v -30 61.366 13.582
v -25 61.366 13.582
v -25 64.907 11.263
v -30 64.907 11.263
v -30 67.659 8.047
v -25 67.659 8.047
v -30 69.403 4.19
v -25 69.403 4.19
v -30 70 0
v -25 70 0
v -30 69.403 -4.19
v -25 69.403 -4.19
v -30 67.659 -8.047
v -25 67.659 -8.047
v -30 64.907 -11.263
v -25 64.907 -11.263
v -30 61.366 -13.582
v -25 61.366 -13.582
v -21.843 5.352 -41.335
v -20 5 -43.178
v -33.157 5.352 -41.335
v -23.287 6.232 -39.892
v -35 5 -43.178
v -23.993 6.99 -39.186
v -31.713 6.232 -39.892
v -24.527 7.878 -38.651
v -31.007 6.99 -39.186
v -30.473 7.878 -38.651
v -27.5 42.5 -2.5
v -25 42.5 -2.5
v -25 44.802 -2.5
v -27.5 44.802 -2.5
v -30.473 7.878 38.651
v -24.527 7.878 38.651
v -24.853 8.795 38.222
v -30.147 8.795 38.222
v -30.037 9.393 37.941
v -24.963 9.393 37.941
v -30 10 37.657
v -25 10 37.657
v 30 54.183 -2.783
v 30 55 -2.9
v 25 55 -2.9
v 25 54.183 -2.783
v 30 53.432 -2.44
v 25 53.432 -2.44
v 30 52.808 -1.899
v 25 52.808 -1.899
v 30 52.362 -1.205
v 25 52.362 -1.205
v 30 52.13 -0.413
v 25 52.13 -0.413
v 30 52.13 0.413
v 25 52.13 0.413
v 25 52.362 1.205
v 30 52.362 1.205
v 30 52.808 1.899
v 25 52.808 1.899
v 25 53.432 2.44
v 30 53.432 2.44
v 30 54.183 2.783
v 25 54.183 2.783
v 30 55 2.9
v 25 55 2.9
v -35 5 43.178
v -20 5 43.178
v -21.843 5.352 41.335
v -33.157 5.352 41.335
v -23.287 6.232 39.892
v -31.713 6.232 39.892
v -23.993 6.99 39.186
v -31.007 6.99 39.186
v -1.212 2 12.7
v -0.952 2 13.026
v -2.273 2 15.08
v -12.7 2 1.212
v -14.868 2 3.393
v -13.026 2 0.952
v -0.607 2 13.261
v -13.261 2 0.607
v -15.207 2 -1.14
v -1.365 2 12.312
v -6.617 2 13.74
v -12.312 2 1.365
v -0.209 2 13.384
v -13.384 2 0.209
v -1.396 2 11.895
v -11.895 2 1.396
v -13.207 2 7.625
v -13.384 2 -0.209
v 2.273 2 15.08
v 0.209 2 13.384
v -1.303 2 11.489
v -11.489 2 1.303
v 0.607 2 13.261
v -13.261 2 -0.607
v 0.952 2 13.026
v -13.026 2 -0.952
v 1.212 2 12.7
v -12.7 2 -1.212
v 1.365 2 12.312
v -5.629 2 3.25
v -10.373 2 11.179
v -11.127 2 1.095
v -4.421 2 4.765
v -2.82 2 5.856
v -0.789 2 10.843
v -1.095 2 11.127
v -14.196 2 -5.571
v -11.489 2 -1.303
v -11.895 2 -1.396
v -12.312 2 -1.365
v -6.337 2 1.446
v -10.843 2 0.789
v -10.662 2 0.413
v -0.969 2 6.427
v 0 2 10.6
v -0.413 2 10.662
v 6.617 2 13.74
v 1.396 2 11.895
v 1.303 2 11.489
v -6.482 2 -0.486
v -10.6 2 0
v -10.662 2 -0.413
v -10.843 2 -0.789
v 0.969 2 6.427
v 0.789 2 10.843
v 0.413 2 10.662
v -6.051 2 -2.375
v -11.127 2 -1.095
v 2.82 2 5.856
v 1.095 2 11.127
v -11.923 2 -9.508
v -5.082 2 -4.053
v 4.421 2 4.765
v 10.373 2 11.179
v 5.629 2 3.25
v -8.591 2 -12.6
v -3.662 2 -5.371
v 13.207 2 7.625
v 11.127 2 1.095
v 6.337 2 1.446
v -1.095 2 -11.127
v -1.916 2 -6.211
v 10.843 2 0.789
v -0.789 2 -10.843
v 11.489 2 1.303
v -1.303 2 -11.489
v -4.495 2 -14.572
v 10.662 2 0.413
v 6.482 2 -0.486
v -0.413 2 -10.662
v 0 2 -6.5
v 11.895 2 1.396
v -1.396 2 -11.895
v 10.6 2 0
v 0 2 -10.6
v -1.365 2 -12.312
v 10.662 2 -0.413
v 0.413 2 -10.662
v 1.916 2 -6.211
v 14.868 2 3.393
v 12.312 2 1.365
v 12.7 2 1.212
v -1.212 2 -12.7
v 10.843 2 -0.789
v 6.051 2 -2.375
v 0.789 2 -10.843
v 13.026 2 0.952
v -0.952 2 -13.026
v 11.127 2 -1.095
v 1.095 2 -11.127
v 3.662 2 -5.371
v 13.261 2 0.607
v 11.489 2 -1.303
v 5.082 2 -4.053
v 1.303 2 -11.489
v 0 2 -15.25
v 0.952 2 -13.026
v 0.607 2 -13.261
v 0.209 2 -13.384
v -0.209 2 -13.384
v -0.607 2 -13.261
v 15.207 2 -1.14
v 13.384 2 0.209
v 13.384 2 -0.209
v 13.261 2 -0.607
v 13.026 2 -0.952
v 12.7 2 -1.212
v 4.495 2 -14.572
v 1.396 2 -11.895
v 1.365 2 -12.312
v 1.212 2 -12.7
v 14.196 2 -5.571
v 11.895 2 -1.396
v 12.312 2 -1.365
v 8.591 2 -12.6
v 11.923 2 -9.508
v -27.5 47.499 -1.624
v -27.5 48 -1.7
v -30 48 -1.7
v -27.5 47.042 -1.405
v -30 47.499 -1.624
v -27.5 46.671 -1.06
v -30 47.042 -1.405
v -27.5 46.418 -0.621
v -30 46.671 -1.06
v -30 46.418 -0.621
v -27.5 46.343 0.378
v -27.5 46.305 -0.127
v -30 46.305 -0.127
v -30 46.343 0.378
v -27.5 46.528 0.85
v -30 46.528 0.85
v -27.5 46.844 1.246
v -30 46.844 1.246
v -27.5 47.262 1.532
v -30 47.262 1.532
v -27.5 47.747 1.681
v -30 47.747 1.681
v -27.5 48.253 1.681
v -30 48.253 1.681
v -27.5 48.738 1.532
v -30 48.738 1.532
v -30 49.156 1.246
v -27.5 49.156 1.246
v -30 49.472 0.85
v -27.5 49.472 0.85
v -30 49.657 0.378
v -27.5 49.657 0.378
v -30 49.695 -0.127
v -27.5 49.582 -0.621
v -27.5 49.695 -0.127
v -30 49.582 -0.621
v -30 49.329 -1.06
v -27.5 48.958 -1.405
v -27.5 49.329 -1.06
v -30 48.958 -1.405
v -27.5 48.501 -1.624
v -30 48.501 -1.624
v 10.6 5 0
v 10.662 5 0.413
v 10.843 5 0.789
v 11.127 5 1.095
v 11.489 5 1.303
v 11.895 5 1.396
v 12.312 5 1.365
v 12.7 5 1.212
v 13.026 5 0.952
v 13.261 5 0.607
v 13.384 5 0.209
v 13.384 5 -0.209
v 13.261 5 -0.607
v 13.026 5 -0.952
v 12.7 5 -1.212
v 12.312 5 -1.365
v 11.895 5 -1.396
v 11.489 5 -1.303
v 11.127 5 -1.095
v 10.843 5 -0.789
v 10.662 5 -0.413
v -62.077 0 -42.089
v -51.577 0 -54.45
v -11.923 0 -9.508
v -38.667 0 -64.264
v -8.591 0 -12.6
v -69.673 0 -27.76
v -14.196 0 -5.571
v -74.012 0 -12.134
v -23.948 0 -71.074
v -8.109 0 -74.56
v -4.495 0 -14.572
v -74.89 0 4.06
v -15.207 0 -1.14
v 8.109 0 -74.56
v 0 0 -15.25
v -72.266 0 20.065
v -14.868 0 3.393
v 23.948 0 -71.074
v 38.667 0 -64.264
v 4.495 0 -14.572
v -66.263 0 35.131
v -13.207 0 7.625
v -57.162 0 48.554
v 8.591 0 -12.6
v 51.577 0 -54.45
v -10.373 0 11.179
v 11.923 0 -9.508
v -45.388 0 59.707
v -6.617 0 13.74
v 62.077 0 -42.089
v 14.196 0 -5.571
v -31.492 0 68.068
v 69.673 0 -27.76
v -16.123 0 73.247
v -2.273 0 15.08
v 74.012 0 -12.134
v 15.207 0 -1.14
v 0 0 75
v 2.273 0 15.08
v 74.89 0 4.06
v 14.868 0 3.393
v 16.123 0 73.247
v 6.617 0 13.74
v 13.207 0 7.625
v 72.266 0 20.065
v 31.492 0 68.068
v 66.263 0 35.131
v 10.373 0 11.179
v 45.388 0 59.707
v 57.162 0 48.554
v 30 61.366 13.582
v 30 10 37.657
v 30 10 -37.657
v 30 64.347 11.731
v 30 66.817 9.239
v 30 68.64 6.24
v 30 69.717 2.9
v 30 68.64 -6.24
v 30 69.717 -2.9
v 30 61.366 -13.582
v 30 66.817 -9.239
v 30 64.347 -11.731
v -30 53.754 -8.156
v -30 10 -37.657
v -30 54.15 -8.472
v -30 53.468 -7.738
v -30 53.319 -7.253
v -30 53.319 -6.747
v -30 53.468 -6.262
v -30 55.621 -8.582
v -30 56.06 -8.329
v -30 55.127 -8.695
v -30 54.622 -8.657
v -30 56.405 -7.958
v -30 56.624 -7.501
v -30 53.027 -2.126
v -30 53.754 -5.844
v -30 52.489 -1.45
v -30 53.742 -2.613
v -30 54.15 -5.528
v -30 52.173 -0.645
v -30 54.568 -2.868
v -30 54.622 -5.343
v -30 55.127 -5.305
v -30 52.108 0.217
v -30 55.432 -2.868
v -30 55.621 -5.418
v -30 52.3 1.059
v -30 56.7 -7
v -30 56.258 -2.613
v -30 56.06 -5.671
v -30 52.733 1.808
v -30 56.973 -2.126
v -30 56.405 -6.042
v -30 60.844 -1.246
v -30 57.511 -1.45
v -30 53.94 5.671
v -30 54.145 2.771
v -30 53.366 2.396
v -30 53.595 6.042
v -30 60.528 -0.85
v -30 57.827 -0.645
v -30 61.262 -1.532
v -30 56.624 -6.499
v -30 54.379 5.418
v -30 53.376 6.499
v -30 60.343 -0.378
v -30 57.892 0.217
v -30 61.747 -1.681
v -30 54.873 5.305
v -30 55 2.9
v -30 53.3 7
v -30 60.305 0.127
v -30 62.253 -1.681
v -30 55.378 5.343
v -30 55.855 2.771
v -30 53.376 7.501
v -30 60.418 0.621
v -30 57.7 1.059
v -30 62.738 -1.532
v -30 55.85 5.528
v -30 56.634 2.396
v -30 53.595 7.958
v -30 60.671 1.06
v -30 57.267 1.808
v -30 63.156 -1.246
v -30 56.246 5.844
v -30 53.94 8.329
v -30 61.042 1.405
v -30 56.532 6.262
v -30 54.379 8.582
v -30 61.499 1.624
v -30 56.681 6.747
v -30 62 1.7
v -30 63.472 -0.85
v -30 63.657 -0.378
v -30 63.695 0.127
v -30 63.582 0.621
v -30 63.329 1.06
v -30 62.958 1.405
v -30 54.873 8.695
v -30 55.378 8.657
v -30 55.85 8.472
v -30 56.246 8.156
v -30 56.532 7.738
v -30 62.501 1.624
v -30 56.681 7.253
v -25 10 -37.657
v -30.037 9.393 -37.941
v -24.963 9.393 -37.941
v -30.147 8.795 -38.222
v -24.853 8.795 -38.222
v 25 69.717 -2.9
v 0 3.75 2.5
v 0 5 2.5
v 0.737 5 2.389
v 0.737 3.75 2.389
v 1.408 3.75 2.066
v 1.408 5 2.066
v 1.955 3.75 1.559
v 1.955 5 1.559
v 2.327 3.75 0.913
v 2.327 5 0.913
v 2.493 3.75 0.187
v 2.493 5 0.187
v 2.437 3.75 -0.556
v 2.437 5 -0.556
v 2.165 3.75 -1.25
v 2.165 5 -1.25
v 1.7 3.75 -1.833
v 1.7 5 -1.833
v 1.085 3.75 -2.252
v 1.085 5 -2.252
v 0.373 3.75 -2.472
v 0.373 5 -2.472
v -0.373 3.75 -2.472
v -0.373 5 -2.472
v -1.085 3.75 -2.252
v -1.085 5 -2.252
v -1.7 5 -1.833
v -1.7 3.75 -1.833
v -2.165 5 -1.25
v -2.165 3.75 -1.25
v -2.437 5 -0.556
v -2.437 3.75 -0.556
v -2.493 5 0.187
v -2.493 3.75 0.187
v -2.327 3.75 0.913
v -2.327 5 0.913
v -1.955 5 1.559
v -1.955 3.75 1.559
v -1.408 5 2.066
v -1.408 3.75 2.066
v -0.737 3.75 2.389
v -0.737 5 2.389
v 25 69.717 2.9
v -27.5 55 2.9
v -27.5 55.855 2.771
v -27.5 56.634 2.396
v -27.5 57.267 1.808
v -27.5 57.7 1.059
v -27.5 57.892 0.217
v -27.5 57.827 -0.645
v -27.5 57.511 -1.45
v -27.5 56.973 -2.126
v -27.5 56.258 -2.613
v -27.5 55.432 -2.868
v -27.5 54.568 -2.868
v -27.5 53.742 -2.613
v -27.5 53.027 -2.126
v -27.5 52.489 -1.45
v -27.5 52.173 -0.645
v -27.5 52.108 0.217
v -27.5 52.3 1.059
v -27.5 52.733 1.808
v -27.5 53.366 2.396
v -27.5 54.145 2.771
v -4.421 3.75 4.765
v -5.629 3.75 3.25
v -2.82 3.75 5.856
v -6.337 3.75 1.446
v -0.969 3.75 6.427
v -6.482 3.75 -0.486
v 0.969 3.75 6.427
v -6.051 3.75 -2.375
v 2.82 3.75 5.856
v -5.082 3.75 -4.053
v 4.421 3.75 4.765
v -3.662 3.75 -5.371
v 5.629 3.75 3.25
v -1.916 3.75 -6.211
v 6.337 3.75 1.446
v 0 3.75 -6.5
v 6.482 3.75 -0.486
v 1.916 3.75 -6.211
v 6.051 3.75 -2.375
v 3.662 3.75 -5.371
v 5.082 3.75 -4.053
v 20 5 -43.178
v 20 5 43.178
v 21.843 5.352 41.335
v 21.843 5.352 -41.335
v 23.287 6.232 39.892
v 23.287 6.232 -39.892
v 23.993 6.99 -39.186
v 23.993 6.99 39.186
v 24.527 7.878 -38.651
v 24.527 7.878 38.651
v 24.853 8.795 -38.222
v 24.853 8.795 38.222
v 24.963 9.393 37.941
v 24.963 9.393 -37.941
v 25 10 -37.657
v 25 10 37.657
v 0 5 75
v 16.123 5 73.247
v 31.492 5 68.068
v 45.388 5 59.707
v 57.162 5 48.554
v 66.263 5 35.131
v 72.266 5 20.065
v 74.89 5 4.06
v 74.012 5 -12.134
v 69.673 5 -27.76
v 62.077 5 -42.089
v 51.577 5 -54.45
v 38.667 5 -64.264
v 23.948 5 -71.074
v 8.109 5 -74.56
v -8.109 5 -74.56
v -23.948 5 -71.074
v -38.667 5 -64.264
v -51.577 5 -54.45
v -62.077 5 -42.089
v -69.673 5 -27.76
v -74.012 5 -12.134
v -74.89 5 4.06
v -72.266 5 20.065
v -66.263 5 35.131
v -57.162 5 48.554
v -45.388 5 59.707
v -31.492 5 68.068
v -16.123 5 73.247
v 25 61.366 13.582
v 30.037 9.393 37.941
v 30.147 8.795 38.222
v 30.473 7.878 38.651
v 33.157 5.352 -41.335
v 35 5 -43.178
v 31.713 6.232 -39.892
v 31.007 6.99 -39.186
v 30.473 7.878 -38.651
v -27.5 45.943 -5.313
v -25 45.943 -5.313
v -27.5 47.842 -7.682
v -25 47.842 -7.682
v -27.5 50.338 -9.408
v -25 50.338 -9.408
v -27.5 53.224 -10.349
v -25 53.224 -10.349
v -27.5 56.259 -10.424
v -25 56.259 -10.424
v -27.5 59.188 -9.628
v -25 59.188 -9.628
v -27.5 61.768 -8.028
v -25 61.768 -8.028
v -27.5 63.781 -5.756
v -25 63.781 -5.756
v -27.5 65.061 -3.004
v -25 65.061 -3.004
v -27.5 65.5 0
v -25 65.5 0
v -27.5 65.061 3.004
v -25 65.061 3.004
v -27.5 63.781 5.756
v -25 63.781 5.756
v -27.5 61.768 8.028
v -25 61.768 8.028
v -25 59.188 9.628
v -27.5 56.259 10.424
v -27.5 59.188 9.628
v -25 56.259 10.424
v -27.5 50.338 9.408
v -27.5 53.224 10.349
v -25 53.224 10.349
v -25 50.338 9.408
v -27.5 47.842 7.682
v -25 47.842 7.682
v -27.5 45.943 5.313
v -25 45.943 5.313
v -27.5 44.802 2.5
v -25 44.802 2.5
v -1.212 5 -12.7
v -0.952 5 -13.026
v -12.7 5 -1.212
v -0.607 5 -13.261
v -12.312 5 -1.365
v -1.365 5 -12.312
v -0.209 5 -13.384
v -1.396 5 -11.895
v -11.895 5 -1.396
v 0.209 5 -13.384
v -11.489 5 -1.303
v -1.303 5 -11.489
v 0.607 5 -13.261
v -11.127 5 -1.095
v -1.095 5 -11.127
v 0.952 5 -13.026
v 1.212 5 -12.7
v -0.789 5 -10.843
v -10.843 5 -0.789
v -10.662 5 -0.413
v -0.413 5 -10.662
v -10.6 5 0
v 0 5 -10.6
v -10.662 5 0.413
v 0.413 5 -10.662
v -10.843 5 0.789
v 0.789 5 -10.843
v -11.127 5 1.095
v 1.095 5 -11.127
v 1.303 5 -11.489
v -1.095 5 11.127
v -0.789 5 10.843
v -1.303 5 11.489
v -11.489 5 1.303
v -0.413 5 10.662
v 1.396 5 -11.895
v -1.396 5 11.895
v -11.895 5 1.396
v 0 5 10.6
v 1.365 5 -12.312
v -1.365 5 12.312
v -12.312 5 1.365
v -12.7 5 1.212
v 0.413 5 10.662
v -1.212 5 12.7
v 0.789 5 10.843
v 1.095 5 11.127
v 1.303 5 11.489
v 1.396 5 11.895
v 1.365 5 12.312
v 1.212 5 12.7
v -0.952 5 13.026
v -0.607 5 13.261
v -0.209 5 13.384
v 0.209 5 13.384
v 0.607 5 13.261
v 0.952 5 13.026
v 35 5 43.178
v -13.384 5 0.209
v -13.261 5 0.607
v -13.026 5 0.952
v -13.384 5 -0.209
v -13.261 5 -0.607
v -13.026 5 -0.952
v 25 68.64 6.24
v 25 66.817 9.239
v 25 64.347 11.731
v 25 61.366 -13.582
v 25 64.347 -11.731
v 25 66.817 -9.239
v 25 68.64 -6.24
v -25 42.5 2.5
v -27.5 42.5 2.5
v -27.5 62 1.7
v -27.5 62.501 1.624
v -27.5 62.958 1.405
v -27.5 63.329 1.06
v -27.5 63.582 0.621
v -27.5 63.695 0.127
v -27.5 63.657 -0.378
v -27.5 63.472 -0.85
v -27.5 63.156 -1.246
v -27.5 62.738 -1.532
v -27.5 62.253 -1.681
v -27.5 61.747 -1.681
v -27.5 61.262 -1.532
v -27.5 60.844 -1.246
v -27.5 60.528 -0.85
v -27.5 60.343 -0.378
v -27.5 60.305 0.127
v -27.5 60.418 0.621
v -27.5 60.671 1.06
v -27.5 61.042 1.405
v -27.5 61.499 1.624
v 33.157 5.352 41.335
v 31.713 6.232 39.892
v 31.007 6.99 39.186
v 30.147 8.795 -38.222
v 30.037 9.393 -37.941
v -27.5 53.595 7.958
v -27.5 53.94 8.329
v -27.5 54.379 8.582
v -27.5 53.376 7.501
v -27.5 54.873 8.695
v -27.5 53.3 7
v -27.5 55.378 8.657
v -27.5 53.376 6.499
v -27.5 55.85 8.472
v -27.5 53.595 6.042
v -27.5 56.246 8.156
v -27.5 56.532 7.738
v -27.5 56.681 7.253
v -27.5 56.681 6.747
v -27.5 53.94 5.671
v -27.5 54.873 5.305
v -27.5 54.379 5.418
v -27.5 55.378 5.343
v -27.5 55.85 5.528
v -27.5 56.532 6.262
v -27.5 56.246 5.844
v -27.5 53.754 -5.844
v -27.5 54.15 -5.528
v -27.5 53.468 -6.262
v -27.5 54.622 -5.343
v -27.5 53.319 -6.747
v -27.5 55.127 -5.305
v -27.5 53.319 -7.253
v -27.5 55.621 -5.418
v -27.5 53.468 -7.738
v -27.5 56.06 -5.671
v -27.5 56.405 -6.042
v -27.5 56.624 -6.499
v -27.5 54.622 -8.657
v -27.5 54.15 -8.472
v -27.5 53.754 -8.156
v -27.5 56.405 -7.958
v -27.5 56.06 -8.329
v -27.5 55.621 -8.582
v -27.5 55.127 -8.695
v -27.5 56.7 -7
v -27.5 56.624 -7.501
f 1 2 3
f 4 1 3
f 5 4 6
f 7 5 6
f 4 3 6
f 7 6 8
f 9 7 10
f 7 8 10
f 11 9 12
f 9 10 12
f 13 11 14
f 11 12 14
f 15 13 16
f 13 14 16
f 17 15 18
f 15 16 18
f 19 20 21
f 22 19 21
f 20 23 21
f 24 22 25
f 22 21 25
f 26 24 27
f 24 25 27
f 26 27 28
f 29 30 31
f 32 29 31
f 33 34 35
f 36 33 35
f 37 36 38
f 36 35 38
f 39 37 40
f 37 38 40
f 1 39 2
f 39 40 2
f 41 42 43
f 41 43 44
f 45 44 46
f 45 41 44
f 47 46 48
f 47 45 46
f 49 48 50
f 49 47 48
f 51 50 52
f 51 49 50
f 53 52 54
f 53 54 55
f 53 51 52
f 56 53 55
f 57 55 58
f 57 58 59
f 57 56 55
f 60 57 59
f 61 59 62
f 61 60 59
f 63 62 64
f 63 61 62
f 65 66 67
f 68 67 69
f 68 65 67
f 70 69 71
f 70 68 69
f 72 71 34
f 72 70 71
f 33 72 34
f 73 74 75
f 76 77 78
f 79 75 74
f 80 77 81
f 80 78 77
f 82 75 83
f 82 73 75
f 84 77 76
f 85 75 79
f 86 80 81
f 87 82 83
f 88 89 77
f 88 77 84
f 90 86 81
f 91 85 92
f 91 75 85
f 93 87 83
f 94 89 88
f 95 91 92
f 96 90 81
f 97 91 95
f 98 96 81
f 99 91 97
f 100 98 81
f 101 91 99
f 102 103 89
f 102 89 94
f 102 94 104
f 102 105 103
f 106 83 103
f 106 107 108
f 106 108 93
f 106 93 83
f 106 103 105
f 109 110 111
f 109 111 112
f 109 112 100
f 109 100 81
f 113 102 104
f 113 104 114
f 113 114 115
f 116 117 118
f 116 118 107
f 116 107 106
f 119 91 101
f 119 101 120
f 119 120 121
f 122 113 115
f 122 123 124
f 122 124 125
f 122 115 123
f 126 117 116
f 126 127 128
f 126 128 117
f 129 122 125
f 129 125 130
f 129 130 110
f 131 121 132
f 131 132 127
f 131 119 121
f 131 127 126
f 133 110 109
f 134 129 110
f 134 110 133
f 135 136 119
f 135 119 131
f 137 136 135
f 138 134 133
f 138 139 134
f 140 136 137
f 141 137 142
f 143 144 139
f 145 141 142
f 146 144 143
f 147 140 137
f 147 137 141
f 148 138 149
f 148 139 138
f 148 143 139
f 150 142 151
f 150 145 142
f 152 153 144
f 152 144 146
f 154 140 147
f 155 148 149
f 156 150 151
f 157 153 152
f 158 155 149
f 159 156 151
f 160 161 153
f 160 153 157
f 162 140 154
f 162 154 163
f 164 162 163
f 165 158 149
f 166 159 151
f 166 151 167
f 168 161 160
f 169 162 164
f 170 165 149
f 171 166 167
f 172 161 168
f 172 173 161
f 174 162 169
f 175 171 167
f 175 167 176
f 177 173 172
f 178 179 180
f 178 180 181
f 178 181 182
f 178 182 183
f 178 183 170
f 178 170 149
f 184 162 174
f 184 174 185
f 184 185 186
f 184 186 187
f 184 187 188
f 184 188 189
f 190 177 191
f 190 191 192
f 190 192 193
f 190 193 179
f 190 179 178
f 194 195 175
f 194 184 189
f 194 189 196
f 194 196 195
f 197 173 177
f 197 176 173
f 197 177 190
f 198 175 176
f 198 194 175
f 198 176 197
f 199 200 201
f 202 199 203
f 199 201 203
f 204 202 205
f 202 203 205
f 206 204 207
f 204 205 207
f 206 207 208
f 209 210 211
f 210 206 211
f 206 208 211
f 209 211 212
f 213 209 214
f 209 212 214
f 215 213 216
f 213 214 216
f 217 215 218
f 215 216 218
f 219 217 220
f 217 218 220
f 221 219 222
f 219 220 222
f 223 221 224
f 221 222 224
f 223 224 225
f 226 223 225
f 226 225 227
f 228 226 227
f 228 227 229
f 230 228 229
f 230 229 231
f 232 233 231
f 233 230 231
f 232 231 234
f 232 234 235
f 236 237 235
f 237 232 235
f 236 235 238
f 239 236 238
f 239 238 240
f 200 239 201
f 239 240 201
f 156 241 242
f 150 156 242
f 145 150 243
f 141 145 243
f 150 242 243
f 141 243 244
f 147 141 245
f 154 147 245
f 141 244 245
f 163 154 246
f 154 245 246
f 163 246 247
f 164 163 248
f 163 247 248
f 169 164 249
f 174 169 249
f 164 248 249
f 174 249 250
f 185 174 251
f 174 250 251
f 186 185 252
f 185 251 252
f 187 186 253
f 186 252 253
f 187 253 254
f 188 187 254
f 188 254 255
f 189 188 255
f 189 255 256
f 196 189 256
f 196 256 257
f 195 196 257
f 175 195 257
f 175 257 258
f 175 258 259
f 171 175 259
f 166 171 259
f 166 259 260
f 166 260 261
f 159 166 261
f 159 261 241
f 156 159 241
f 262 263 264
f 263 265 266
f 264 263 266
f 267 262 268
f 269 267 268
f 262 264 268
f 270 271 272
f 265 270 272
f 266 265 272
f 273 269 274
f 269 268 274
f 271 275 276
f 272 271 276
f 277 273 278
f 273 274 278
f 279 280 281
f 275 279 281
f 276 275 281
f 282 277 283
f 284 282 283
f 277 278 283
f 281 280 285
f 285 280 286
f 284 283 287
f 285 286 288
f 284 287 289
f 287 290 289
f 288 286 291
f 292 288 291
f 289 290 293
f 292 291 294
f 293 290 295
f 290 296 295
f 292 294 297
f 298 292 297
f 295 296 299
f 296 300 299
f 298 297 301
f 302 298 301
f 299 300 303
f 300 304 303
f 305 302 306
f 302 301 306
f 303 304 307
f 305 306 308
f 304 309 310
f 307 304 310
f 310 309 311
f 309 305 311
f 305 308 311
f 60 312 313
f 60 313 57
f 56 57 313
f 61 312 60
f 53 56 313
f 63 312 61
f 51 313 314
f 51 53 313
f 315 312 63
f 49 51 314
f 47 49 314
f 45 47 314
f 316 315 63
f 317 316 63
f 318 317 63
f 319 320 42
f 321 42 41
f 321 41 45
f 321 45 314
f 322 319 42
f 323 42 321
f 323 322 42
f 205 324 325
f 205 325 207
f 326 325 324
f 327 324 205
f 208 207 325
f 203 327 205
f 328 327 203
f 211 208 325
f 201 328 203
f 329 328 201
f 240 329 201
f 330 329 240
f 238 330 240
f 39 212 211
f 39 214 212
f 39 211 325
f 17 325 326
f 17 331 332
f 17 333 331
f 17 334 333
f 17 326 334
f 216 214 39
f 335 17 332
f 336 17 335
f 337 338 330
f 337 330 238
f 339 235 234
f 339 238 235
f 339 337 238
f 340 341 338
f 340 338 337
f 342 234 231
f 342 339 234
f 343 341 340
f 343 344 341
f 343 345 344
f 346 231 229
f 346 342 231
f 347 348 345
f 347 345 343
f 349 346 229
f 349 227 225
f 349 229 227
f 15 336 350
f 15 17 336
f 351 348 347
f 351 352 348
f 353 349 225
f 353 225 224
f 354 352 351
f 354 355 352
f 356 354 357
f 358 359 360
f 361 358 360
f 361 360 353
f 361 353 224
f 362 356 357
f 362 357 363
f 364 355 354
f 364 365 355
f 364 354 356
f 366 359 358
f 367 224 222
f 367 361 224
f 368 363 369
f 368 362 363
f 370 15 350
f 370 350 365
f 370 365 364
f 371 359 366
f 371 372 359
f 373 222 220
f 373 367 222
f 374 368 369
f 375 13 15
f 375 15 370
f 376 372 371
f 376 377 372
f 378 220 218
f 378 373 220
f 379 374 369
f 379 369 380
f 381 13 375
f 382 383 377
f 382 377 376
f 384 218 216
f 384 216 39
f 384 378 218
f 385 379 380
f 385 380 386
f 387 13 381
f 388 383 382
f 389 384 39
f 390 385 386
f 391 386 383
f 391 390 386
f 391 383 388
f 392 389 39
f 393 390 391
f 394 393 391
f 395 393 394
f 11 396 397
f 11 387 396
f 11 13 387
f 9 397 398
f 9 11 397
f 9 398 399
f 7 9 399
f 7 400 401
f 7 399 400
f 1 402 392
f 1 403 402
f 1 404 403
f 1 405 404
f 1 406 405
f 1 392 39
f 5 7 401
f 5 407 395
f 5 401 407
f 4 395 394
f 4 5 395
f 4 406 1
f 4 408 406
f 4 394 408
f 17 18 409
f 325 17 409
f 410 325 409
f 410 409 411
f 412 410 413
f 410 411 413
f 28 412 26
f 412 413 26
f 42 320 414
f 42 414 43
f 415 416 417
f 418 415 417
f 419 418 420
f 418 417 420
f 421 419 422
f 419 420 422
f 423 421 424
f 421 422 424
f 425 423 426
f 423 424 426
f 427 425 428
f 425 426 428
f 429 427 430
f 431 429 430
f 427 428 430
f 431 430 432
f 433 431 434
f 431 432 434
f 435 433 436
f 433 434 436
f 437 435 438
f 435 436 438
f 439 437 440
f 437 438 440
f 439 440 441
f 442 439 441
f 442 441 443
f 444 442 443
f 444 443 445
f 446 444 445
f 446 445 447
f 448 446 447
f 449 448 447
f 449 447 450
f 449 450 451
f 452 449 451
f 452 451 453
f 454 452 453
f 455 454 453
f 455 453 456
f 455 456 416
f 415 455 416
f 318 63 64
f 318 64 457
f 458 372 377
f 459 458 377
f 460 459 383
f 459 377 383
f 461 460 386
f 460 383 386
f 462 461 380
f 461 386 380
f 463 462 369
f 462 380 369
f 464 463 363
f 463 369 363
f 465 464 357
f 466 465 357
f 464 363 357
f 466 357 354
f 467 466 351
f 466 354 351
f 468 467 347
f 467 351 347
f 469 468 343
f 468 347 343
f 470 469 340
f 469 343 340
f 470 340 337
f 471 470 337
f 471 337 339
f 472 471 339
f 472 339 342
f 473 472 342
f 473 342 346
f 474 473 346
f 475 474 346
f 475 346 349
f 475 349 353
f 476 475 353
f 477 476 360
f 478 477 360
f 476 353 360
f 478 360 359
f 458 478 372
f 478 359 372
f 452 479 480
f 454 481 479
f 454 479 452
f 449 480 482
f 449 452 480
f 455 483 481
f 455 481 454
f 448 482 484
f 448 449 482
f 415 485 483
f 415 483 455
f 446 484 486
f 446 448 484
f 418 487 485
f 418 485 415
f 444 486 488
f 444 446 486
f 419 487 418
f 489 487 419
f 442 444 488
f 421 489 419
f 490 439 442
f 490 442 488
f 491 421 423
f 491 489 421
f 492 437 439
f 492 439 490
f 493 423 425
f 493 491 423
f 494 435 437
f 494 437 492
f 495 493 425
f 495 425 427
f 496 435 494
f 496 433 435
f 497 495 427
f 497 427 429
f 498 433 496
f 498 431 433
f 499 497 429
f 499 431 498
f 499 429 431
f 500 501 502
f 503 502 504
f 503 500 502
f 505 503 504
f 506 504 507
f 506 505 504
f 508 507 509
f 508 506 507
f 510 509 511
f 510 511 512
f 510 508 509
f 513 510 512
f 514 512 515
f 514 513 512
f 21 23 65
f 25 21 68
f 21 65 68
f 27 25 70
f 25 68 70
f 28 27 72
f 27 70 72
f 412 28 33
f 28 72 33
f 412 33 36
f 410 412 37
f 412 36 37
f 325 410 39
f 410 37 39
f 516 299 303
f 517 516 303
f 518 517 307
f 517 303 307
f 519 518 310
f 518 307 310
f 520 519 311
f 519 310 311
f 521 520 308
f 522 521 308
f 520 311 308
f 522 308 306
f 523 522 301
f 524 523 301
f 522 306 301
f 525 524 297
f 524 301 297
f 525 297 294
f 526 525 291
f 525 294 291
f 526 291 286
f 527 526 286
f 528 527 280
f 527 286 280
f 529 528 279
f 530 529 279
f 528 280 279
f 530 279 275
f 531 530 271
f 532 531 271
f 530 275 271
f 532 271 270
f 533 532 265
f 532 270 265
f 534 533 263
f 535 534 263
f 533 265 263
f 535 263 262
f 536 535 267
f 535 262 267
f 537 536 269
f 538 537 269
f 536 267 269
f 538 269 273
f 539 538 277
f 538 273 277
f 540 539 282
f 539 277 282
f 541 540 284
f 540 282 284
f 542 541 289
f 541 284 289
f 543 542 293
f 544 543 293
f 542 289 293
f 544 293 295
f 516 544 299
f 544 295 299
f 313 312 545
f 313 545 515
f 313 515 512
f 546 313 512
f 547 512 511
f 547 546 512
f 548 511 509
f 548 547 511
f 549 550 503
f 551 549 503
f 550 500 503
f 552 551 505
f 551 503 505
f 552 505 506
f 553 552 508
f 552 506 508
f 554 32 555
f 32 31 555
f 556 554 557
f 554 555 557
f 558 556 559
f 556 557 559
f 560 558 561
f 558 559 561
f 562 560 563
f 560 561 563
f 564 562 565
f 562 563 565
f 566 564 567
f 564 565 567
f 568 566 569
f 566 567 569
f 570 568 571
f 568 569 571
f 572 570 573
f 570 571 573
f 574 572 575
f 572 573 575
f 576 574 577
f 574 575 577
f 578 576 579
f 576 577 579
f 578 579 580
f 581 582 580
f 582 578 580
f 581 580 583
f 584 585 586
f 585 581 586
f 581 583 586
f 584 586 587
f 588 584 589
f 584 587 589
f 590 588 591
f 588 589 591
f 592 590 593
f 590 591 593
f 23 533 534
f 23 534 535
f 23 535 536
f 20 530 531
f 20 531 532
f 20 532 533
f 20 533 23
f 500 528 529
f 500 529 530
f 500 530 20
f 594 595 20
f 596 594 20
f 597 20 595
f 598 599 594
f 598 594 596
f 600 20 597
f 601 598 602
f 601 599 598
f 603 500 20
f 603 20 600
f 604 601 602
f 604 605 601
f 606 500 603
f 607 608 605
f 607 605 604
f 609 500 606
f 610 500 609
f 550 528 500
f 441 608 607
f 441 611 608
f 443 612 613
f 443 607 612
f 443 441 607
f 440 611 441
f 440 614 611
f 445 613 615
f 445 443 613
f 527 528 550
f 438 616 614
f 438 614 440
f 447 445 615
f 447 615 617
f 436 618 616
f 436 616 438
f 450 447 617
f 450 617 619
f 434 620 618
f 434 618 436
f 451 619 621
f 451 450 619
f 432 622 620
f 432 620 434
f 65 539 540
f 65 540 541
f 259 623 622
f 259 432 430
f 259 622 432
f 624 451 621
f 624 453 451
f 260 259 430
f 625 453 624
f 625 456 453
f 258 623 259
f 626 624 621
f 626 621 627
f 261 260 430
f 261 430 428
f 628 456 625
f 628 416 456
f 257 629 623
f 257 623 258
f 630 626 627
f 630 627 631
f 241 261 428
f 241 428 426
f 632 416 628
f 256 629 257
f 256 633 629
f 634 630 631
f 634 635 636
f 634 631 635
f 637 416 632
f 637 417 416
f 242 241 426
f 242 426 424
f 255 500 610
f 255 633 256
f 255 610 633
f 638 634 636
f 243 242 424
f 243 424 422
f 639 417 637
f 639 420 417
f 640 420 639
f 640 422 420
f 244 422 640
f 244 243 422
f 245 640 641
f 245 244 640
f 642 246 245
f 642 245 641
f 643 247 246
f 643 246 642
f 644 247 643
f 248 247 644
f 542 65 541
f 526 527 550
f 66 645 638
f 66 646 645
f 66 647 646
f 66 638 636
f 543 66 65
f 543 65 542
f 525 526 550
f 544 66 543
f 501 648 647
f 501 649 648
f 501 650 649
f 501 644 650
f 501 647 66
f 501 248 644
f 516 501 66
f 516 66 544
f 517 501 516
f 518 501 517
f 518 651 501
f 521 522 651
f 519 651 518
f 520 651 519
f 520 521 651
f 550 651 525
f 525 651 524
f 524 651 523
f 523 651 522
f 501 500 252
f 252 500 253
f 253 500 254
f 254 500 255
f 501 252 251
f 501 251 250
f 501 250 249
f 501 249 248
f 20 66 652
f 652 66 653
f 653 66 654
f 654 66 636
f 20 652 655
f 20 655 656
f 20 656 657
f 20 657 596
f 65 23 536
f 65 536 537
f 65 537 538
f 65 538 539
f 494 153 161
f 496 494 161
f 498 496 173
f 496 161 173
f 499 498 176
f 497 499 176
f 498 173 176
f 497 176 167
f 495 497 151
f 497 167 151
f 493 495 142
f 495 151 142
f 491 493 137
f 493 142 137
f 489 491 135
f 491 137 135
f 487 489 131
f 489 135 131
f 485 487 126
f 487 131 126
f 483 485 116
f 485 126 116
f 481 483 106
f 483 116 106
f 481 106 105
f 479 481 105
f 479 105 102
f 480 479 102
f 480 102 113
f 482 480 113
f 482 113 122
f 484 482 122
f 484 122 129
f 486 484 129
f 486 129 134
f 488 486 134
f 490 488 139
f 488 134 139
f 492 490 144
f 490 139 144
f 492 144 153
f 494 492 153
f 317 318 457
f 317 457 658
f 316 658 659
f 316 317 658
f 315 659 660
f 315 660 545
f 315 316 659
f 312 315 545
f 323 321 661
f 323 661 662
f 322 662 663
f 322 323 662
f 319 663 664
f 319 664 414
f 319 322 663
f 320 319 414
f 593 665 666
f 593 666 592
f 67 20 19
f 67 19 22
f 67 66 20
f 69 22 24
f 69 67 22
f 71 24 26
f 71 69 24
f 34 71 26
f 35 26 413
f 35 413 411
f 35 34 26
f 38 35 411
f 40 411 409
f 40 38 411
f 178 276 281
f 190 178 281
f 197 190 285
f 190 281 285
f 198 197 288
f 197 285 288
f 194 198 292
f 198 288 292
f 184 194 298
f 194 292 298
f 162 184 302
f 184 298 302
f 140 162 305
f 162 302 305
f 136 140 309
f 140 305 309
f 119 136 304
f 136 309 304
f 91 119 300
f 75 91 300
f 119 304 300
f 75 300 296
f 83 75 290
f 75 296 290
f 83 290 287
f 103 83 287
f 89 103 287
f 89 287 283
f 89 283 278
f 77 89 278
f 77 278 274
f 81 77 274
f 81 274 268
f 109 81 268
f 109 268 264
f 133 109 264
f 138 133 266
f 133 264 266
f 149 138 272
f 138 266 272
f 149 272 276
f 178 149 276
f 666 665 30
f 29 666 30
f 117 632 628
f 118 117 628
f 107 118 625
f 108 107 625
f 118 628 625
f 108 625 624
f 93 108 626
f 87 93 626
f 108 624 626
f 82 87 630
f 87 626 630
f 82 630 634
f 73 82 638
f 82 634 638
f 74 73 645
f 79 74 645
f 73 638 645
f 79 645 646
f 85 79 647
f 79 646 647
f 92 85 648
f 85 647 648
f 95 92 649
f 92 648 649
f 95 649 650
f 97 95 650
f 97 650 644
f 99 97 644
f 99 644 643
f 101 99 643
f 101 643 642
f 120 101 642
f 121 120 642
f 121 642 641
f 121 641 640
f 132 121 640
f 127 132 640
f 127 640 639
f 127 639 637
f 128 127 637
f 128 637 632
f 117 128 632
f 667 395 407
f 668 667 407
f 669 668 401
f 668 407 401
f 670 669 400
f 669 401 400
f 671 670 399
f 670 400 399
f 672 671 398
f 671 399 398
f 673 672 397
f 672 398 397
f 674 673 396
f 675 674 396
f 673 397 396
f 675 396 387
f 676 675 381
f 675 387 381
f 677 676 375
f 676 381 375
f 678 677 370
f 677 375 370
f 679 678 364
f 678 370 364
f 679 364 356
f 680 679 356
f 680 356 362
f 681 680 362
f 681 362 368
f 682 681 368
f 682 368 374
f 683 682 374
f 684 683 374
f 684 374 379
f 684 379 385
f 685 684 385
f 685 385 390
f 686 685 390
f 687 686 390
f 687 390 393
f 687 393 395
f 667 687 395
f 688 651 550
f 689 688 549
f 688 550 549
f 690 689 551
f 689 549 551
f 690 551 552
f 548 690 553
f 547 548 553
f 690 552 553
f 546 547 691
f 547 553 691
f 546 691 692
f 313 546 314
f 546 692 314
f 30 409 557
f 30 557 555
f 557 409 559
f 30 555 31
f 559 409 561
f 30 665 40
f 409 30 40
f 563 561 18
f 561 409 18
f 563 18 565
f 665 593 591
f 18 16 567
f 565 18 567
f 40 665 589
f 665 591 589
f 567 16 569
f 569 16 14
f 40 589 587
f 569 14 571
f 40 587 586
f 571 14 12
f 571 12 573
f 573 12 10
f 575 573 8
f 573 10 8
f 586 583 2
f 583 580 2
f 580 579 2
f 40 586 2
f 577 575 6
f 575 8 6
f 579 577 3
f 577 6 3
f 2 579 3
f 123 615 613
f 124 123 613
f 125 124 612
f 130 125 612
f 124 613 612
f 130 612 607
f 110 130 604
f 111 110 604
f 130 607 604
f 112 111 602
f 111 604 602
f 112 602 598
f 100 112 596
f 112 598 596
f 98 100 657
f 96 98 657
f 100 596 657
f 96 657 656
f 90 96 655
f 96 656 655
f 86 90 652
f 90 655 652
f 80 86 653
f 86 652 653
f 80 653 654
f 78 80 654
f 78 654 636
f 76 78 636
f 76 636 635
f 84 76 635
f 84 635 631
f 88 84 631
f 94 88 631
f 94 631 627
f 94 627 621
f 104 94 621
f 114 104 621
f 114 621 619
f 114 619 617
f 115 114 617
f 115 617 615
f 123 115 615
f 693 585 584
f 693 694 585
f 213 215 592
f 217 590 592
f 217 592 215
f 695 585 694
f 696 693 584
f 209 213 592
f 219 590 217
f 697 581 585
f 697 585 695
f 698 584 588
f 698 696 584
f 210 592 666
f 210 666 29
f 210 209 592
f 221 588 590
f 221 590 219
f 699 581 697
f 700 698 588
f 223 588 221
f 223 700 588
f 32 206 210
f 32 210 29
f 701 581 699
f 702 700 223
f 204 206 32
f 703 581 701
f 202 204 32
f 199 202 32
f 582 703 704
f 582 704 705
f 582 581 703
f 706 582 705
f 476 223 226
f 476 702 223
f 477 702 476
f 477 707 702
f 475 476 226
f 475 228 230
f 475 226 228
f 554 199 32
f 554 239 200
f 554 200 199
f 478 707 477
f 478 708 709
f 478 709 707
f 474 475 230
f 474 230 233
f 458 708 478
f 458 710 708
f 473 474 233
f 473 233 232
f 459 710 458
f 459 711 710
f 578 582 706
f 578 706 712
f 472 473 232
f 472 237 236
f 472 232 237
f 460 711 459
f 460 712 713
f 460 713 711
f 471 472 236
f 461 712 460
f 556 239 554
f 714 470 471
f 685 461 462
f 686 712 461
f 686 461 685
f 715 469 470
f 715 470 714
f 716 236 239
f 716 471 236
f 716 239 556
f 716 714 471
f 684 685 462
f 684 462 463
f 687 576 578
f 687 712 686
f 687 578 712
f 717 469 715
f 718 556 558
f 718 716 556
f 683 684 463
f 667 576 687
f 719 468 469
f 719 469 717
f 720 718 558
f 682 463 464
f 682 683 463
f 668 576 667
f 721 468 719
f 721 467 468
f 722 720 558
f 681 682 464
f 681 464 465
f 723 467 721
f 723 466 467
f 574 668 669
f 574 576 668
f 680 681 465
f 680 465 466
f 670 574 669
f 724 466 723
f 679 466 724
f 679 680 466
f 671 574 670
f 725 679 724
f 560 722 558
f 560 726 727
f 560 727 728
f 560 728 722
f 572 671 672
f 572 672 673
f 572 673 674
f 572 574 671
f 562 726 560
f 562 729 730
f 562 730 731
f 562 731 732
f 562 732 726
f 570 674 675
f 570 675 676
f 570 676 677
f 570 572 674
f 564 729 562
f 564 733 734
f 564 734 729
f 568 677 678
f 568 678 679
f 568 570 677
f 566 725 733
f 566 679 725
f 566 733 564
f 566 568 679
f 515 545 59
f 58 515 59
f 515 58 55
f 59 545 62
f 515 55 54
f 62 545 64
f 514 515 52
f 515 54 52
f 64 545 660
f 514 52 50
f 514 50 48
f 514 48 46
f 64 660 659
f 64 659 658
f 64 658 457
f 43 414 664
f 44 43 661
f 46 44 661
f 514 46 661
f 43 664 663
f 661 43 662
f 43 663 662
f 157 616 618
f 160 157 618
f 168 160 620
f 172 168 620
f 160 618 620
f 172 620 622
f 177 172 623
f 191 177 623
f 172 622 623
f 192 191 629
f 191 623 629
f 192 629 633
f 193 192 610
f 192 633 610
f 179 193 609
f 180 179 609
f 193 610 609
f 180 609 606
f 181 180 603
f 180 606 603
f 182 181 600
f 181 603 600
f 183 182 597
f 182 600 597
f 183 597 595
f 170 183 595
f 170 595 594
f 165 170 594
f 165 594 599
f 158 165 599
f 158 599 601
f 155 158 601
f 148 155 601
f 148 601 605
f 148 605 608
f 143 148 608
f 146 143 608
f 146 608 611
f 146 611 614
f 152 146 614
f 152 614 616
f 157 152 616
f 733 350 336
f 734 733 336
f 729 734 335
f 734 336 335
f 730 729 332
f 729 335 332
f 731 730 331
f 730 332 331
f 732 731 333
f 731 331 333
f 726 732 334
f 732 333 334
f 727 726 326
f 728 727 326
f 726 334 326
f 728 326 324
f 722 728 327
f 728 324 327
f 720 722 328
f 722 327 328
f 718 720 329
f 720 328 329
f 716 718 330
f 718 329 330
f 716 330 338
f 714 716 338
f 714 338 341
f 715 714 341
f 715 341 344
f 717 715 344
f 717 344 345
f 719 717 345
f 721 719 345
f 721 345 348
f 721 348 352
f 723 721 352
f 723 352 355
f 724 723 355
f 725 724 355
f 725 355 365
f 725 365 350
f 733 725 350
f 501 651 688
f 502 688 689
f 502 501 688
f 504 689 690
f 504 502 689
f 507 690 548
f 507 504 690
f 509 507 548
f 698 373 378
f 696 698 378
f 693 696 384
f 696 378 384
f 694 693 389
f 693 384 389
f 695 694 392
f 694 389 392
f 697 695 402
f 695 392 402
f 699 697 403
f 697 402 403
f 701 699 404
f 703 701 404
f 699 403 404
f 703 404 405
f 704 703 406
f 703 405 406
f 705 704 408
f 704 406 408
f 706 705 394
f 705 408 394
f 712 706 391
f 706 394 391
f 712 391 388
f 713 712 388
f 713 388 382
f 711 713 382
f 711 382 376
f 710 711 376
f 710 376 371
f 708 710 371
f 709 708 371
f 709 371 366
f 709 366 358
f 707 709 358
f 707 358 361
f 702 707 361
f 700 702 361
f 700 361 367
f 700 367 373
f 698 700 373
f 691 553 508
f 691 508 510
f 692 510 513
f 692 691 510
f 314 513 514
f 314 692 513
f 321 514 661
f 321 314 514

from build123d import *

# Parameters (mm, degrees)
SKETCH1_R           = 75
BOSS_EXTRUDE1_DEPTH = 5
BOSS_EXTRUDE2_DEPTH = 5
BOSS_EXTRUDE3_START = -5
BOSS_EXTRUDE3_DEPTH = 5
SKETCH6_R           = 1.5
CUT_EXTRUDE1_DEPTH  = 5
SKETCH7_R           = 2.9
CUT_EXTRUDE2_DEPTH  = 2.5
SKETCH8_R           = 0.6
CUT_EXTRUDE3_DEPTH  = 5
CIRPATTERN1_COUNT   = 4
SKETCH10_R          = 1.7
CUT_EXTRUDE4_DEPTH  = 3
CIRPATTERN2_COUNT   = 4
SKETCH11_R          = 2.5
CUT_EXTRUDE5_DEPTH  = 5
SKETCH12_R          = 1.4
CUT_EXTRUDE6_DEPTH  = 5
CIRPATTERN3_COUNT   = 4
SKETCH16_R          = 10.5
CUT_EXTRUDE10_DEPTH = 2.5
CUT_EXTRUDE11_DEPTH = 5
FILLET1_R           = 5
SKETCH19_R          = 15.25
CUT_EXTRUDE12_DEPTH = 2
SKETCH20_W          = 5
SKETCH20_H          = 4
CUT_EXTRUDE13_DEPTH = 2.5
SKETCH21_R          = 6.5
CUT_EXTRUDE14_DEPTH = 1.75


with BuildPart() as part:
    # Sketch1 → Boss-Extrude1 (new body)
    with BuildSketch(Plane(origin=(0, 0, 0), x_dir=(1, 0, 0), z_dir=(0, 1, 0))):
        with Locations(Location((0, 0, 0), (0, 0, 270))):
            Circle(SKETCH1_R)
    extrude(amount=BOSS_EXTRUDE1_DEPTH)

    # Sketch4 → Boss-Extrude2 (add)
    with BuildSketch(Plane.ZY.offset(25)):
        with BuildLine():
            Line((-13.582225242, 61.365780194), (-40, 5))
            Line((-40, 5), (40, 5))
            Line((40, 5), (13.582225242, 61.365780194))
            ThreePointArc((13.582225242, 61.365780194), (0, 70), (-13.582225242, 61.365780194))
        make_face()
    extrude(amount=BOSS_EXTRUDE2_DEPTH)

    # Sketch5 → Boss-Extrude3 (add)
    with BuildSketch(Plane.ZY.offset(-25).offset(BOSS_EXTRUDE3_START)):
        with BuildLine():
            Line((13.582225242, 61.365780194), (40, 5))
            Line((40, 5), (-40, 5))
            Line((-40, 5), (-13.582225242, 61.365780194))
            ThreePointArc((-13.582225242, 61.365780194), (0, 70), (13.582225242, 61.365780194))
        make_face()
    extrude(amount=BOSS_EXTRUDE3_DEPTH)

    # Sketch6 → Cut-Extrude1 (cut)
    with BuildSketch(Plane.ZY.offset(30)):
        with Locations((0, 55)):
            Circle(SKETCH6_R)
    extrude(amount=-CUT_EXTRUDE1_DEPTH, mode=Mode.SUBTRACT)

    # Sketch7 → Cut-Extrude2 (cut)
    with BuildSketch(Plane.ZY.offset(30)):
        with Locations((0, 55)):
            Circle(SKETCH7_R)
    extrude(amount=-CUT_EXTRUDE2_DEPTH, mode=Mode.SUBTRACT)

    # Sketch8 → Cut-Extrude3 (cut)
    with BuildSketch(Plane.ZY.offset(30)):
        with Locations((0, 62.25)):
            Circle(SKETCH8_R)
    cut_extrude3 = extrude(amount=-CUT_EXTRUDE3_DEPTH, mode=Mode.SUBTRACT)

    # CirPattern1: Cut-Extrude3 ×4 about axis
    cirpattern1_axis = Axis((0, 55, 0), (1, 0, 0))
    for i in range(1, CIRPATTERN1_COUNT):
        add(cut_extrude3.rotate(cirpattern1_axis, i * 360 / CIRPATTERN1_COUNT), mode=Mode.SUBTRACT)

    # Sketch10 → Cut-Extrude4 (cut)
    with BuildSketch(Plane.ZY.offset(30)):
        with Locations((0, 62)):
            Circle(SKETCH10_R)
    cut_extrude4 = extrude(amount=-CUT_EXTRUDE4_DEPTH, mode=Mode.SUBTRACT)

    # CirPattern2: Cut-Extrude4 ×4 about axis
    cirpattern2_axis = Axis((0, 55, 0), (1, 0, 0))
    for i in range(1, CIRPATTERN2_COUNT):
        add(cut_extrude4.rotate(cirpattern2_axis, i * 360 / CIRPATTERN2_COUNT), mode=Mode.SUBTRACT)

    # Sketch11 → Cut-Extrude5 (cut)
    with BuildSketch(Plane(origin=(0, 5, 0), x_dir=(1, 0, 0), z_dir=(0, 1, 0))):
        with Locations(Location((0, 0, 0), (0, 0, 270))):
            Circle(SKETCH11_R)
    extrude(amount=-CUT_EXTRUDE5_DEPTH, mode=Mode.SUBTRACT)

    # Sketch12 → Cut-Extrude6 (cut)
    with BuildSketch(Plane(origin=(0, 5, 0), x_dir=(1, 0, 0), z_dir=(0, 1, 0))):
        with Locations(Location((0, 12, 0), (0, 0, 270))):
            Circle(SKETCH12_R)
    cut_extrude6 = extrude(amount=-CUT_EXTRUDE6_DEPTH, mode=Mode.SUBTRACT)

    # CirPattern3: Cut-Extrude6 ×4 about axis
    cirpattern3_axis = Axis((0, 0, 0), (0, 1, 0))
    for i in range(1, CIRPATTERN3_COUNT):
        add(cut_extrude6.rotate(cirpattern3_axis, i * 360 / CIRPATTERN3_COUNT), mode=Mode.SUBTRACT)

    # Sketch16 → Cut-Extrude10 (cut)
    with BuildSketch(Plane(origin=(-25, 0, 0), x_dir=(0, 0, -1), z_dir=(1, 0, 0))):
        with Locations((0, 55)):
            Circle(SKETCH16_R)
    extrude(amount=-CUT_EXTRUDE10_DEPTH, mode=Mode.SUBTRACT)

    # Sketch18 → Cut-Extrude11 (cut)
    with BuildSketch(Plane(origin=(30, 0, 0), x_dir=(0, 0, -1), z_dir=(1, 0, 0))):
        with BuildLine():
            Line((-2.9, 55), (-2.9, 69.716996976))
            ThreePointArc((-2.9, 69.716996976), (0, 70), (2.9, 69.716996976))
            Line((2.9, 69.716996976), (2.9, 55))
            ThreePointArc((2.9, 55), (0, 52.1), (-2.9, 55))
        make_face()
    extrude(amount=-CUT_EXTRUDE11_DEPTH, mode=Mode.SUBTRACT)

    # Fillet1
    fillet1_edges = [part.edges().sort_by_distance(p)[0] for p in [
        (30, 5, 0),
        (27.5, 5, 40),
        (27.5, 5, -40),
        (25, 5, 0),
        (-25, 5, 0),
        (-27.5, 5, -40),
        (-27.5, 5, 40),
        (-30, 5, 0),
    ]]
    fillet(fillet1_edges, radius=FILLET1_R)

    # Sketch19 → Cut-Extrude12 (cut)
    with BuildSketch(Plane(origin=(0, 0, 0), x_dir=(-1, 0, 0), z_dir=(0, -1, 0))):
        with Locations(Location((0, 0, 0), (0, 0, 90))):
            Circle(SKETCH19_R)
    extrude(amount=-CUT_EXTRUDE12_DEPTH, mode=Mode.SUBTRACT)

    # Sketch20 → Cut-Extrude13 (cut)
    with BuildSketch(Plane(origin=(-25, 0, 0), x_dir=(0, 0, -1), z_dir=(1, 0, 0))):
        with Locations((0, 44.5)):
            Rectangle(SKETCH20_W, SKETCH20_H)
    extrude(amount=-CUT_EXTRUDE13_DEPTH, mode=Mode.SUBTRACT)

    # Sketch21 → Cut-Extrude14 (cut)
    with BuildSketch(Plane(origin=(0, 2, 0), x_dir=(-1, 0, 0), z_dir=(0, -1, 0))):
        with Locations(Location((0, 0, 0), (0, 0, 90))):
            Circle(SKETCH21_R)
    extrude(amount=-CUT_EXTRUDE14_DEPTH, mode=Mode.SUBTRACT)


solid = part.part
